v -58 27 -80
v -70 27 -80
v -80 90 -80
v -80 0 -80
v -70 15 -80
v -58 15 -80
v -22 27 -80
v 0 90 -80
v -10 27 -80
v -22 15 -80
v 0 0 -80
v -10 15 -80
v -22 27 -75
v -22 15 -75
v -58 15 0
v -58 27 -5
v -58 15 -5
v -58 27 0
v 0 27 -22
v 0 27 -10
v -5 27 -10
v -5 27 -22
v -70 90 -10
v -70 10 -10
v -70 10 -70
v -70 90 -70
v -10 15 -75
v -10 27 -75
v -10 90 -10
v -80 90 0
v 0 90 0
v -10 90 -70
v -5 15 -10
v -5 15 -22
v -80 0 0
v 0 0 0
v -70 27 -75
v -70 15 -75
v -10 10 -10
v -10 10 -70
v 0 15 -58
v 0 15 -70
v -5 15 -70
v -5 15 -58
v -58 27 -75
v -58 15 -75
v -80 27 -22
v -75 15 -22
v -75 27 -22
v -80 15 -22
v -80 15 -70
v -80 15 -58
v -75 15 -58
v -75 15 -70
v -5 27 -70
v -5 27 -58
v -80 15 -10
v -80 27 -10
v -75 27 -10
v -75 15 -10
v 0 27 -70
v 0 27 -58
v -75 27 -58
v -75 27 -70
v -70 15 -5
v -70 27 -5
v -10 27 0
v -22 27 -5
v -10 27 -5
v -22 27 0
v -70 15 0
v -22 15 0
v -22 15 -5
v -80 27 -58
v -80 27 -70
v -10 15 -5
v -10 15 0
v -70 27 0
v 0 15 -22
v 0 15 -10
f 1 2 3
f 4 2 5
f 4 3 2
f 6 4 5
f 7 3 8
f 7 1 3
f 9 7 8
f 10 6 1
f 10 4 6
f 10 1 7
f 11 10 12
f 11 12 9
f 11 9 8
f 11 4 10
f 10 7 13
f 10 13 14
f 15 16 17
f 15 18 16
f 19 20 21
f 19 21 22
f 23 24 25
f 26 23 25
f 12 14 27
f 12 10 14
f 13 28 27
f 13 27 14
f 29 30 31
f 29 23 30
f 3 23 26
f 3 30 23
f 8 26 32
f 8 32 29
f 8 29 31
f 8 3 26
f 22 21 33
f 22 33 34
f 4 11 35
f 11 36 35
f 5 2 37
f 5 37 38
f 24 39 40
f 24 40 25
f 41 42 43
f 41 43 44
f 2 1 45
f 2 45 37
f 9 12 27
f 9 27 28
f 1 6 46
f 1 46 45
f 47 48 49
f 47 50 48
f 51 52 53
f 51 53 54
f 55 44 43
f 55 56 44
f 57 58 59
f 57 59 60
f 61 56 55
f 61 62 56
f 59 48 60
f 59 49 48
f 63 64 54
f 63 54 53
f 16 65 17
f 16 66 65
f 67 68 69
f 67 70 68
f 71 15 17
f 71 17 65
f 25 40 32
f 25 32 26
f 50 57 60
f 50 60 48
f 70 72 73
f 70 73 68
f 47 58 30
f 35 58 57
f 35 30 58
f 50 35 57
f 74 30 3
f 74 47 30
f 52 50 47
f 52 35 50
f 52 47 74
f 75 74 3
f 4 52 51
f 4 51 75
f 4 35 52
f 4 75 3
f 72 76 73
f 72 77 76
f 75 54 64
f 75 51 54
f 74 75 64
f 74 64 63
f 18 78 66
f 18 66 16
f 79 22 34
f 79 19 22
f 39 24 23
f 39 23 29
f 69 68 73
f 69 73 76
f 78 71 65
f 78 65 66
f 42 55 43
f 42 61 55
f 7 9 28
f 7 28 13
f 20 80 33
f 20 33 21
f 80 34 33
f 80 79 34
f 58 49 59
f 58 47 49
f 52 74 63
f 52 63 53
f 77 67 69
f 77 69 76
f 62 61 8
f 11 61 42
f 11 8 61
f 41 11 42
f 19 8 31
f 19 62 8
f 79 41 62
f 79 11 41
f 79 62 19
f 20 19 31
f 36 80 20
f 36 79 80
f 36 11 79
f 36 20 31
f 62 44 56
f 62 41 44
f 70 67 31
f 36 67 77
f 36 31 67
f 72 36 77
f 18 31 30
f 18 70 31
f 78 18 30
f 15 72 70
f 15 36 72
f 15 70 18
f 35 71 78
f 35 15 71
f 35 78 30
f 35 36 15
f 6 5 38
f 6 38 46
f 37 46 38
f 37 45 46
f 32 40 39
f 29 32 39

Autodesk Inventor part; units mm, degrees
ref_plane "YZ Plane" through (0, 0, 0) normal (1, 0, 0) x (0, 1, 0)
ref_plane "XZ Plane" through (0, 0, 0) normal (0, 1, 0) x (-1, 0, 0)
ref_plane "XY Plane" through (0, 0, 0) normal (0, 0, 1) x (1, 0, 0)
sketch "Sketch1" plane through (0, 0, 0) normal (0, 1, 0) x (-1, 0, 0)
  line L0 (0, 0) -> (80, 0)
  line L1 (80, 0) -> (80, -80)
  line L2 (80, -80) -> (0, -80)
  line L3 (0, -80) -> (0, 0)
  dimension "d0" = 80
  dimension "d1" = 80
extrude "Extrusion1" add sketch "Sketch1" along normal blind 10
sketch "Sketch2" plane through (0, 10, 0) normal (0, 1, 0) x (1, 0, 0)
  line L0 (-80, 0) -> (0, 0) projected
  line L1 (0, 0) -> (-80, 0)
  line L2 (-80, 0) -> (-80, 10)
  line L3 (-80, 10) -> (0, 10)
  line L4 (0, 10) -> (0, 0)
  line L5 (0, 80) -> (-80, 80) projected
  line L6 (-80, 0) -> (-70, 0)
  line L7 (-70, 0) -> (-70, 80)
  line L8 (-70, 80) -> (-80, 80)
  line L9 (-80, 80) -> (-80, 0)
  line L10 (-80, 80) -> (0, 80)
  line L11 (0, 80) -> (0, 70)
  line L12 (0, 70) -> (-80, 70)
  line L13 (-80, 70) -> (-80, 80)
  line L14 (0, 80) -> (-10, 80)
  line L15 (-10, 80) -> (-10, 0)
  line L16 (-10, 0) -> (0, 0)
  line L17 (0, 0) -> (0, 80)
  point P0 (-70, 10)
  point P1 (-70, 70)
  point P2 (-10, 70)
  point P3 (-10, 10)
  dimension "d4" = 10
  dimension "d5" = 10
  dimension "d6" = 10
  dimension "d7" = 10
  dimension "d8" = 80
  dimension "d9" = 0
extrude "Extrusion2" add sketch "Sketch2" along normal blind 80 contours L2 L3 L7 L0 | L7 L3 L15 L0 | L9 L12 L7 L3 | L15 L3 L4 L0 | L9 L5 L7 L12 | L15 L12 L17 L3 | L7 L5 L15 L12 | L15 L5 L11 L12
sketch "Sketch3" plane through (-80, 0, 0) normal (0, 0, 1) x (1, 0, 0)
  line L0 (10, 27) -> (22, 27)
  line L1 (22, 27) -> (22, 15)
  line L2 (22, 15) -> (10, 15)
  line L3 (10, 15) -> (10, 27)
  line L4 (0, 0) -> (0, 90) projected
  line L5 (0, 0) -> (80, 0) projected
  line L6 (58, 27) -> (70, 27)
  line L7 (70, 27) -> (70, 15)
  line L8 (70, 15) -> (58, 15)
  line L9 (58, 15) -> (58, 27)
  line L10 (80, 0) -> (80, 90) projected
  dimension "d12" = 12
  dimension "d13" = 12
  dimension "d14" = 10
  dimension "d15" = 15
  dimension "d16" = 12
  dimension "d17" = 12
  dimension "d18" = 10
  dimension "d19" = 15
sketch "Sketch4" plane through (0, 0, 0) normal (1, 0, 0) x (0, 0, -1)
  line L0 (10, 27) -> (22, 27)
  line L1 (22, 27) -> (22, 15)
  line L2 (22, 15) -> (10, 15)
  line L3 (10, 15) -> (10, 27)
  line L4 (0, 0) -> (0, 90) projected
  line L5 (0, 0) -> (80, 0) projected
  line L6 (58, 27) -> (70, 27)
  line L7 (70, 27) -> (70, 15)
  line L8 (70, 15) -> (58, 15)
  line L9 (58, 15) -> (58, 27)
  line L10 (80, 0) -> (80, 90) projected
  point P0 (16, 15)
  dimension "d20" = 12
  dimension "d21" = 12
  dimension "d22" = 10
  dimension "d23" = 15
  dimension "d24" = 12
  dimension "d25" = 12
  dimension "d26" = 10
  dimension "d27" = 15
sketch "Sketch5" plane through (0, 0, -80) normal (0, 0, -1) x (-1, 0, 0)
  line L0 (10, 27) -> (22, 27)
  line L1 (22, 27) -> (22, 15)
  line L2 (22, 15) -> (10, 15)
  line L3 (10, 15) -> (10, 27)
  line L4 (0, 0) -> (0, 90) projected
  line L5 (0, 0) -> (80, 0) projected
  line L6 (58, 27) -> (70, 27)
  line L7 (70, 27) -> (70, 15)
  line L8 (70, 15) -> (58, 15)
  line L9 (58, 15) -> (58, 27)
  line L10 (80, 0) -> (80, 90) projected
  dimension "d28" = 12
  dimension "d29" = 12
  dimension "d30" = 10
  dimension "d31" = 15
  dimension "d32" = 12
  dimension "d33" = 12
  dimension "d34" = 10
  dimension "d35" = 15
sketch "Sketch6" plane through (0, 0, -80) normal (0, 0, -1) x (-1, 0, 0)
  point P0 (0, 0)
sketch "Sketch7" plane through (-80, 0, -80) normal (-1, 0, 0) x (0, 0, 1)
  line L0 (10, 27) -> (22, 27)
  line L1 (22, 27) -> (22, 15)
  line L2 (22, 15) -> (10, 15)
  line L3 (10, 15) -> (10, 27)
  line L4 (0, 0) -> (0, 90) projected
  line L5 (0, 0) -> (80, 0) projected
  line L6 (58, 27) -> (70, 27)
  line L7 (70, 27) -> (70, 15)
  line L8 (70, 15) -> (58, 15)
  line L9 (58, 15) -> (58, 27)
  line L10 (80, 0) -> (80, 90) projected
  point P0 (16, 15)
  dimension "d36" = 12
  dimension "d37" = 12
  dimension "d38" = 10
  dimension "d39" = 15
  dimension "d40" = 12
  dimension "d41" = 12
  dimension "d42" = 10
  dimension "d43" = 15
extrude "Extrusion3" cut sketch "Sketch7" against normal blind 5
extrude "Extrusion4" cut sketch "Sketch4" against normal blind 5
extrude "Extrusion5" cut sketch "Sketch3" against normal blind 5
extrude "Extrusion6" cut sketch "Sketch5" against normal blind 5
properties part number "Box"
